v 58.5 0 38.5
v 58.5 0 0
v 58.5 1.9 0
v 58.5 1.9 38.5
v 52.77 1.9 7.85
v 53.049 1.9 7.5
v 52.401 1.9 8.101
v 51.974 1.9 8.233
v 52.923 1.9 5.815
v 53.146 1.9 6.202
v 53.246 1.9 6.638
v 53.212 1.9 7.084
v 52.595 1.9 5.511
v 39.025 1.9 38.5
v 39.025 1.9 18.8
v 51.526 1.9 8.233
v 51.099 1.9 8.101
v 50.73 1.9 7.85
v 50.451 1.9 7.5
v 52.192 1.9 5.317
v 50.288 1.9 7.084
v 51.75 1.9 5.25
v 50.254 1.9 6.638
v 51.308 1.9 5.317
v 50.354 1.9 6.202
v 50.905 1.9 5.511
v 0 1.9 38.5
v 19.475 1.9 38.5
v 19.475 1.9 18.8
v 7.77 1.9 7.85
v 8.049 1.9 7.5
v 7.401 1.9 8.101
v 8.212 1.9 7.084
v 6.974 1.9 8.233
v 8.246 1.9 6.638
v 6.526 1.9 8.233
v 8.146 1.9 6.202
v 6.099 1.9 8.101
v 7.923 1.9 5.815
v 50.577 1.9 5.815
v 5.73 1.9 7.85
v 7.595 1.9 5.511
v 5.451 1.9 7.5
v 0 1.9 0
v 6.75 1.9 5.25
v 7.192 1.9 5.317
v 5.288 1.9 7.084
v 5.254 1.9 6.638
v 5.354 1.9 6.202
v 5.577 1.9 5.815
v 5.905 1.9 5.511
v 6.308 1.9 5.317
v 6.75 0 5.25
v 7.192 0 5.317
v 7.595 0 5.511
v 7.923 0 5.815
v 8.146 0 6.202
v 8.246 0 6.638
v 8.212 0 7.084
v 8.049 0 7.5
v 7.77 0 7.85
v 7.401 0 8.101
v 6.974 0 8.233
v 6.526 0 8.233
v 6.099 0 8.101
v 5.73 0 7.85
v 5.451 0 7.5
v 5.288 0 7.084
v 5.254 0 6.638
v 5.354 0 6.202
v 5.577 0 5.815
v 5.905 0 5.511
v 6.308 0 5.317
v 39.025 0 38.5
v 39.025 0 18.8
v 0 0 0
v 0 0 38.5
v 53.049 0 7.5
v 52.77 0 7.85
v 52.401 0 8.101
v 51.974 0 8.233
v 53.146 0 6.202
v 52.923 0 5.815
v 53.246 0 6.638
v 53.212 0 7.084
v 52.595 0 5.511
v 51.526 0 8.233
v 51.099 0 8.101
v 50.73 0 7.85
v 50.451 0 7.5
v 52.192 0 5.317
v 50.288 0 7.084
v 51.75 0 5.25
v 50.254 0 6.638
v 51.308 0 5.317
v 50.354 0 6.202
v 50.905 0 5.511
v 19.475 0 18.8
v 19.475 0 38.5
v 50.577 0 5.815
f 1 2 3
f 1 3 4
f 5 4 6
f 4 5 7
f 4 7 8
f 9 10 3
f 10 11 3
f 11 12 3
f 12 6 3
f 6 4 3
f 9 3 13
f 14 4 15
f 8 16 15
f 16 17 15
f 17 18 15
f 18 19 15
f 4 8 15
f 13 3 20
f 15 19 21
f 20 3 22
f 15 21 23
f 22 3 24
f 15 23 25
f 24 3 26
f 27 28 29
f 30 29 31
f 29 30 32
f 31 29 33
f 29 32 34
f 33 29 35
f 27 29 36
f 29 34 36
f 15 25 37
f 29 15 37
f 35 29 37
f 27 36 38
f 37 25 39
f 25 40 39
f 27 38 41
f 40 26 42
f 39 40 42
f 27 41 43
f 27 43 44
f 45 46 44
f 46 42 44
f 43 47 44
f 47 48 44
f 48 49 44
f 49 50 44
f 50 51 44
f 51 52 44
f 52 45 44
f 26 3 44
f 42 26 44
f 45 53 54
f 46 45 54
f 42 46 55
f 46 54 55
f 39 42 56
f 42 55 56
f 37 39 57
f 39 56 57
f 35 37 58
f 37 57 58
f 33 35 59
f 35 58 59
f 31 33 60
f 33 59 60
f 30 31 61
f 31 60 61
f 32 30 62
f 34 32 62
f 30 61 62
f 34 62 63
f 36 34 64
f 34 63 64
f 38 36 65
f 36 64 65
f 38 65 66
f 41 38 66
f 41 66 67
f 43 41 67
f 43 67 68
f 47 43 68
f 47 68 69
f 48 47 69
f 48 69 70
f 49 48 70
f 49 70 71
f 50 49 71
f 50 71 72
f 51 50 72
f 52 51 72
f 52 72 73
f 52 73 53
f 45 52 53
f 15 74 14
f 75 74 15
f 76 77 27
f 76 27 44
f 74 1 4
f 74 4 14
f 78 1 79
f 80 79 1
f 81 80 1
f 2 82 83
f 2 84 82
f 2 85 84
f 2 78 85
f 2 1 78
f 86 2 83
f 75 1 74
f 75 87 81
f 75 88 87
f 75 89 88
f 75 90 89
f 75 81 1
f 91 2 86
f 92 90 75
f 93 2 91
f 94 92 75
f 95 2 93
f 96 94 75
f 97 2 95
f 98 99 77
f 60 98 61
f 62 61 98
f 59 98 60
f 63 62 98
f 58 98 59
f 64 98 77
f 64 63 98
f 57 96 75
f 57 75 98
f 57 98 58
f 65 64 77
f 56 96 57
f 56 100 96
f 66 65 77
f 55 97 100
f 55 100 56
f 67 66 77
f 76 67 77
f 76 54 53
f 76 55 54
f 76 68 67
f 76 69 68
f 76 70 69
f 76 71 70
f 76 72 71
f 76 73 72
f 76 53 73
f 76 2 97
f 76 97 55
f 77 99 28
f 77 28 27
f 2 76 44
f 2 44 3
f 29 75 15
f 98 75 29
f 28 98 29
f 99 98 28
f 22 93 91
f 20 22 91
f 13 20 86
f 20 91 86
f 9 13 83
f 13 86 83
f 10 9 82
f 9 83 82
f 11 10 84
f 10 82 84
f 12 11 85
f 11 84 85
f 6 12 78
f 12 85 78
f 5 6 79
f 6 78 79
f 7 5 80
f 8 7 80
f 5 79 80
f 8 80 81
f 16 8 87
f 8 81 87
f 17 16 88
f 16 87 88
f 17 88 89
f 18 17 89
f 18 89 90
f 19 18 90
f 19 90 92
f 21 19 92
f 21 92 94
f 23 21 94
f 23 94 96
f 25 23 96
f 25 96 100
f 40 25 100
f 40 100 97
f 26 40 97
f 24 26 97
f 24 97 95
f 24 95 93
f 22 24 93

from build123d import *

# Parameters (mm, degrees)
EXTRUDE_1_DEPTH     = 1.9
CUT_EXTRUDE_1_REACH = 72.058
SKETCH_2_R          = 1.5


with BuildPart() as part:
    # 草图1 → 凸台-拉伸1 (new body)
    with BuildSketch(Plane(origin=(0, 0, 0), x_dir=(1, 0, 0), z_dir=(0, 1, 0))):
        Polygon((0, 0), (58.5, 0), (58.5, -38.5), (39.025, -38.5), (39.025, -18.8), (19.475, -18.8), (19.475, -38.5), (0, -38.5), align=None)
    extrude(amount=EXTRUDE_1_DEPTH)

    # 草图2 → 切除-拉伸1 (cut, up to next)
    with BuildSketch(Plane.XZ, mode=Mode.PRIVATE) as cut_extrude_1_sk1:
        with Locations(Location((51.75, 6.75, 0), (0, 0, 270))):
            Circle(SKETCH_2_R)
    cut_extrude_1_tool1 = extrude(cut_extrude_1_sk1.sketch, amount=-CUT_EXTRUDE_1_REACH, mode=Mode.PRIVATE) & part.part
    # 草图2 → 切除-拉伸1 (cut, up to next)
    with BuildSketch(Plane.XZ, mode=Mode.PRIVATE) as cut_extrude_1_sk2:
        with Locations(Location((6.75, 6.75, 0), (0, 0, 270))):
            Circle(SKETCH_2_R)
    cut_extrude_1_tool2 = extrude(cut_extrude_1_sk2.sketch, amount=-CUT_EXTRUDE_1_REACH, mode=Mode.PRIVATE) & part.part
    add(cut_extrude_1_tool1.solids().sort_by_distance((51.75, 0, 6.75))[0], mode=Mode.SUBTRACT)
    add(cut_extrude_1_tool2.solids().sort_by_distance((6.75, 0, 6.75))[0], mode=Mode.SUBTRACT)


solid = part.part
